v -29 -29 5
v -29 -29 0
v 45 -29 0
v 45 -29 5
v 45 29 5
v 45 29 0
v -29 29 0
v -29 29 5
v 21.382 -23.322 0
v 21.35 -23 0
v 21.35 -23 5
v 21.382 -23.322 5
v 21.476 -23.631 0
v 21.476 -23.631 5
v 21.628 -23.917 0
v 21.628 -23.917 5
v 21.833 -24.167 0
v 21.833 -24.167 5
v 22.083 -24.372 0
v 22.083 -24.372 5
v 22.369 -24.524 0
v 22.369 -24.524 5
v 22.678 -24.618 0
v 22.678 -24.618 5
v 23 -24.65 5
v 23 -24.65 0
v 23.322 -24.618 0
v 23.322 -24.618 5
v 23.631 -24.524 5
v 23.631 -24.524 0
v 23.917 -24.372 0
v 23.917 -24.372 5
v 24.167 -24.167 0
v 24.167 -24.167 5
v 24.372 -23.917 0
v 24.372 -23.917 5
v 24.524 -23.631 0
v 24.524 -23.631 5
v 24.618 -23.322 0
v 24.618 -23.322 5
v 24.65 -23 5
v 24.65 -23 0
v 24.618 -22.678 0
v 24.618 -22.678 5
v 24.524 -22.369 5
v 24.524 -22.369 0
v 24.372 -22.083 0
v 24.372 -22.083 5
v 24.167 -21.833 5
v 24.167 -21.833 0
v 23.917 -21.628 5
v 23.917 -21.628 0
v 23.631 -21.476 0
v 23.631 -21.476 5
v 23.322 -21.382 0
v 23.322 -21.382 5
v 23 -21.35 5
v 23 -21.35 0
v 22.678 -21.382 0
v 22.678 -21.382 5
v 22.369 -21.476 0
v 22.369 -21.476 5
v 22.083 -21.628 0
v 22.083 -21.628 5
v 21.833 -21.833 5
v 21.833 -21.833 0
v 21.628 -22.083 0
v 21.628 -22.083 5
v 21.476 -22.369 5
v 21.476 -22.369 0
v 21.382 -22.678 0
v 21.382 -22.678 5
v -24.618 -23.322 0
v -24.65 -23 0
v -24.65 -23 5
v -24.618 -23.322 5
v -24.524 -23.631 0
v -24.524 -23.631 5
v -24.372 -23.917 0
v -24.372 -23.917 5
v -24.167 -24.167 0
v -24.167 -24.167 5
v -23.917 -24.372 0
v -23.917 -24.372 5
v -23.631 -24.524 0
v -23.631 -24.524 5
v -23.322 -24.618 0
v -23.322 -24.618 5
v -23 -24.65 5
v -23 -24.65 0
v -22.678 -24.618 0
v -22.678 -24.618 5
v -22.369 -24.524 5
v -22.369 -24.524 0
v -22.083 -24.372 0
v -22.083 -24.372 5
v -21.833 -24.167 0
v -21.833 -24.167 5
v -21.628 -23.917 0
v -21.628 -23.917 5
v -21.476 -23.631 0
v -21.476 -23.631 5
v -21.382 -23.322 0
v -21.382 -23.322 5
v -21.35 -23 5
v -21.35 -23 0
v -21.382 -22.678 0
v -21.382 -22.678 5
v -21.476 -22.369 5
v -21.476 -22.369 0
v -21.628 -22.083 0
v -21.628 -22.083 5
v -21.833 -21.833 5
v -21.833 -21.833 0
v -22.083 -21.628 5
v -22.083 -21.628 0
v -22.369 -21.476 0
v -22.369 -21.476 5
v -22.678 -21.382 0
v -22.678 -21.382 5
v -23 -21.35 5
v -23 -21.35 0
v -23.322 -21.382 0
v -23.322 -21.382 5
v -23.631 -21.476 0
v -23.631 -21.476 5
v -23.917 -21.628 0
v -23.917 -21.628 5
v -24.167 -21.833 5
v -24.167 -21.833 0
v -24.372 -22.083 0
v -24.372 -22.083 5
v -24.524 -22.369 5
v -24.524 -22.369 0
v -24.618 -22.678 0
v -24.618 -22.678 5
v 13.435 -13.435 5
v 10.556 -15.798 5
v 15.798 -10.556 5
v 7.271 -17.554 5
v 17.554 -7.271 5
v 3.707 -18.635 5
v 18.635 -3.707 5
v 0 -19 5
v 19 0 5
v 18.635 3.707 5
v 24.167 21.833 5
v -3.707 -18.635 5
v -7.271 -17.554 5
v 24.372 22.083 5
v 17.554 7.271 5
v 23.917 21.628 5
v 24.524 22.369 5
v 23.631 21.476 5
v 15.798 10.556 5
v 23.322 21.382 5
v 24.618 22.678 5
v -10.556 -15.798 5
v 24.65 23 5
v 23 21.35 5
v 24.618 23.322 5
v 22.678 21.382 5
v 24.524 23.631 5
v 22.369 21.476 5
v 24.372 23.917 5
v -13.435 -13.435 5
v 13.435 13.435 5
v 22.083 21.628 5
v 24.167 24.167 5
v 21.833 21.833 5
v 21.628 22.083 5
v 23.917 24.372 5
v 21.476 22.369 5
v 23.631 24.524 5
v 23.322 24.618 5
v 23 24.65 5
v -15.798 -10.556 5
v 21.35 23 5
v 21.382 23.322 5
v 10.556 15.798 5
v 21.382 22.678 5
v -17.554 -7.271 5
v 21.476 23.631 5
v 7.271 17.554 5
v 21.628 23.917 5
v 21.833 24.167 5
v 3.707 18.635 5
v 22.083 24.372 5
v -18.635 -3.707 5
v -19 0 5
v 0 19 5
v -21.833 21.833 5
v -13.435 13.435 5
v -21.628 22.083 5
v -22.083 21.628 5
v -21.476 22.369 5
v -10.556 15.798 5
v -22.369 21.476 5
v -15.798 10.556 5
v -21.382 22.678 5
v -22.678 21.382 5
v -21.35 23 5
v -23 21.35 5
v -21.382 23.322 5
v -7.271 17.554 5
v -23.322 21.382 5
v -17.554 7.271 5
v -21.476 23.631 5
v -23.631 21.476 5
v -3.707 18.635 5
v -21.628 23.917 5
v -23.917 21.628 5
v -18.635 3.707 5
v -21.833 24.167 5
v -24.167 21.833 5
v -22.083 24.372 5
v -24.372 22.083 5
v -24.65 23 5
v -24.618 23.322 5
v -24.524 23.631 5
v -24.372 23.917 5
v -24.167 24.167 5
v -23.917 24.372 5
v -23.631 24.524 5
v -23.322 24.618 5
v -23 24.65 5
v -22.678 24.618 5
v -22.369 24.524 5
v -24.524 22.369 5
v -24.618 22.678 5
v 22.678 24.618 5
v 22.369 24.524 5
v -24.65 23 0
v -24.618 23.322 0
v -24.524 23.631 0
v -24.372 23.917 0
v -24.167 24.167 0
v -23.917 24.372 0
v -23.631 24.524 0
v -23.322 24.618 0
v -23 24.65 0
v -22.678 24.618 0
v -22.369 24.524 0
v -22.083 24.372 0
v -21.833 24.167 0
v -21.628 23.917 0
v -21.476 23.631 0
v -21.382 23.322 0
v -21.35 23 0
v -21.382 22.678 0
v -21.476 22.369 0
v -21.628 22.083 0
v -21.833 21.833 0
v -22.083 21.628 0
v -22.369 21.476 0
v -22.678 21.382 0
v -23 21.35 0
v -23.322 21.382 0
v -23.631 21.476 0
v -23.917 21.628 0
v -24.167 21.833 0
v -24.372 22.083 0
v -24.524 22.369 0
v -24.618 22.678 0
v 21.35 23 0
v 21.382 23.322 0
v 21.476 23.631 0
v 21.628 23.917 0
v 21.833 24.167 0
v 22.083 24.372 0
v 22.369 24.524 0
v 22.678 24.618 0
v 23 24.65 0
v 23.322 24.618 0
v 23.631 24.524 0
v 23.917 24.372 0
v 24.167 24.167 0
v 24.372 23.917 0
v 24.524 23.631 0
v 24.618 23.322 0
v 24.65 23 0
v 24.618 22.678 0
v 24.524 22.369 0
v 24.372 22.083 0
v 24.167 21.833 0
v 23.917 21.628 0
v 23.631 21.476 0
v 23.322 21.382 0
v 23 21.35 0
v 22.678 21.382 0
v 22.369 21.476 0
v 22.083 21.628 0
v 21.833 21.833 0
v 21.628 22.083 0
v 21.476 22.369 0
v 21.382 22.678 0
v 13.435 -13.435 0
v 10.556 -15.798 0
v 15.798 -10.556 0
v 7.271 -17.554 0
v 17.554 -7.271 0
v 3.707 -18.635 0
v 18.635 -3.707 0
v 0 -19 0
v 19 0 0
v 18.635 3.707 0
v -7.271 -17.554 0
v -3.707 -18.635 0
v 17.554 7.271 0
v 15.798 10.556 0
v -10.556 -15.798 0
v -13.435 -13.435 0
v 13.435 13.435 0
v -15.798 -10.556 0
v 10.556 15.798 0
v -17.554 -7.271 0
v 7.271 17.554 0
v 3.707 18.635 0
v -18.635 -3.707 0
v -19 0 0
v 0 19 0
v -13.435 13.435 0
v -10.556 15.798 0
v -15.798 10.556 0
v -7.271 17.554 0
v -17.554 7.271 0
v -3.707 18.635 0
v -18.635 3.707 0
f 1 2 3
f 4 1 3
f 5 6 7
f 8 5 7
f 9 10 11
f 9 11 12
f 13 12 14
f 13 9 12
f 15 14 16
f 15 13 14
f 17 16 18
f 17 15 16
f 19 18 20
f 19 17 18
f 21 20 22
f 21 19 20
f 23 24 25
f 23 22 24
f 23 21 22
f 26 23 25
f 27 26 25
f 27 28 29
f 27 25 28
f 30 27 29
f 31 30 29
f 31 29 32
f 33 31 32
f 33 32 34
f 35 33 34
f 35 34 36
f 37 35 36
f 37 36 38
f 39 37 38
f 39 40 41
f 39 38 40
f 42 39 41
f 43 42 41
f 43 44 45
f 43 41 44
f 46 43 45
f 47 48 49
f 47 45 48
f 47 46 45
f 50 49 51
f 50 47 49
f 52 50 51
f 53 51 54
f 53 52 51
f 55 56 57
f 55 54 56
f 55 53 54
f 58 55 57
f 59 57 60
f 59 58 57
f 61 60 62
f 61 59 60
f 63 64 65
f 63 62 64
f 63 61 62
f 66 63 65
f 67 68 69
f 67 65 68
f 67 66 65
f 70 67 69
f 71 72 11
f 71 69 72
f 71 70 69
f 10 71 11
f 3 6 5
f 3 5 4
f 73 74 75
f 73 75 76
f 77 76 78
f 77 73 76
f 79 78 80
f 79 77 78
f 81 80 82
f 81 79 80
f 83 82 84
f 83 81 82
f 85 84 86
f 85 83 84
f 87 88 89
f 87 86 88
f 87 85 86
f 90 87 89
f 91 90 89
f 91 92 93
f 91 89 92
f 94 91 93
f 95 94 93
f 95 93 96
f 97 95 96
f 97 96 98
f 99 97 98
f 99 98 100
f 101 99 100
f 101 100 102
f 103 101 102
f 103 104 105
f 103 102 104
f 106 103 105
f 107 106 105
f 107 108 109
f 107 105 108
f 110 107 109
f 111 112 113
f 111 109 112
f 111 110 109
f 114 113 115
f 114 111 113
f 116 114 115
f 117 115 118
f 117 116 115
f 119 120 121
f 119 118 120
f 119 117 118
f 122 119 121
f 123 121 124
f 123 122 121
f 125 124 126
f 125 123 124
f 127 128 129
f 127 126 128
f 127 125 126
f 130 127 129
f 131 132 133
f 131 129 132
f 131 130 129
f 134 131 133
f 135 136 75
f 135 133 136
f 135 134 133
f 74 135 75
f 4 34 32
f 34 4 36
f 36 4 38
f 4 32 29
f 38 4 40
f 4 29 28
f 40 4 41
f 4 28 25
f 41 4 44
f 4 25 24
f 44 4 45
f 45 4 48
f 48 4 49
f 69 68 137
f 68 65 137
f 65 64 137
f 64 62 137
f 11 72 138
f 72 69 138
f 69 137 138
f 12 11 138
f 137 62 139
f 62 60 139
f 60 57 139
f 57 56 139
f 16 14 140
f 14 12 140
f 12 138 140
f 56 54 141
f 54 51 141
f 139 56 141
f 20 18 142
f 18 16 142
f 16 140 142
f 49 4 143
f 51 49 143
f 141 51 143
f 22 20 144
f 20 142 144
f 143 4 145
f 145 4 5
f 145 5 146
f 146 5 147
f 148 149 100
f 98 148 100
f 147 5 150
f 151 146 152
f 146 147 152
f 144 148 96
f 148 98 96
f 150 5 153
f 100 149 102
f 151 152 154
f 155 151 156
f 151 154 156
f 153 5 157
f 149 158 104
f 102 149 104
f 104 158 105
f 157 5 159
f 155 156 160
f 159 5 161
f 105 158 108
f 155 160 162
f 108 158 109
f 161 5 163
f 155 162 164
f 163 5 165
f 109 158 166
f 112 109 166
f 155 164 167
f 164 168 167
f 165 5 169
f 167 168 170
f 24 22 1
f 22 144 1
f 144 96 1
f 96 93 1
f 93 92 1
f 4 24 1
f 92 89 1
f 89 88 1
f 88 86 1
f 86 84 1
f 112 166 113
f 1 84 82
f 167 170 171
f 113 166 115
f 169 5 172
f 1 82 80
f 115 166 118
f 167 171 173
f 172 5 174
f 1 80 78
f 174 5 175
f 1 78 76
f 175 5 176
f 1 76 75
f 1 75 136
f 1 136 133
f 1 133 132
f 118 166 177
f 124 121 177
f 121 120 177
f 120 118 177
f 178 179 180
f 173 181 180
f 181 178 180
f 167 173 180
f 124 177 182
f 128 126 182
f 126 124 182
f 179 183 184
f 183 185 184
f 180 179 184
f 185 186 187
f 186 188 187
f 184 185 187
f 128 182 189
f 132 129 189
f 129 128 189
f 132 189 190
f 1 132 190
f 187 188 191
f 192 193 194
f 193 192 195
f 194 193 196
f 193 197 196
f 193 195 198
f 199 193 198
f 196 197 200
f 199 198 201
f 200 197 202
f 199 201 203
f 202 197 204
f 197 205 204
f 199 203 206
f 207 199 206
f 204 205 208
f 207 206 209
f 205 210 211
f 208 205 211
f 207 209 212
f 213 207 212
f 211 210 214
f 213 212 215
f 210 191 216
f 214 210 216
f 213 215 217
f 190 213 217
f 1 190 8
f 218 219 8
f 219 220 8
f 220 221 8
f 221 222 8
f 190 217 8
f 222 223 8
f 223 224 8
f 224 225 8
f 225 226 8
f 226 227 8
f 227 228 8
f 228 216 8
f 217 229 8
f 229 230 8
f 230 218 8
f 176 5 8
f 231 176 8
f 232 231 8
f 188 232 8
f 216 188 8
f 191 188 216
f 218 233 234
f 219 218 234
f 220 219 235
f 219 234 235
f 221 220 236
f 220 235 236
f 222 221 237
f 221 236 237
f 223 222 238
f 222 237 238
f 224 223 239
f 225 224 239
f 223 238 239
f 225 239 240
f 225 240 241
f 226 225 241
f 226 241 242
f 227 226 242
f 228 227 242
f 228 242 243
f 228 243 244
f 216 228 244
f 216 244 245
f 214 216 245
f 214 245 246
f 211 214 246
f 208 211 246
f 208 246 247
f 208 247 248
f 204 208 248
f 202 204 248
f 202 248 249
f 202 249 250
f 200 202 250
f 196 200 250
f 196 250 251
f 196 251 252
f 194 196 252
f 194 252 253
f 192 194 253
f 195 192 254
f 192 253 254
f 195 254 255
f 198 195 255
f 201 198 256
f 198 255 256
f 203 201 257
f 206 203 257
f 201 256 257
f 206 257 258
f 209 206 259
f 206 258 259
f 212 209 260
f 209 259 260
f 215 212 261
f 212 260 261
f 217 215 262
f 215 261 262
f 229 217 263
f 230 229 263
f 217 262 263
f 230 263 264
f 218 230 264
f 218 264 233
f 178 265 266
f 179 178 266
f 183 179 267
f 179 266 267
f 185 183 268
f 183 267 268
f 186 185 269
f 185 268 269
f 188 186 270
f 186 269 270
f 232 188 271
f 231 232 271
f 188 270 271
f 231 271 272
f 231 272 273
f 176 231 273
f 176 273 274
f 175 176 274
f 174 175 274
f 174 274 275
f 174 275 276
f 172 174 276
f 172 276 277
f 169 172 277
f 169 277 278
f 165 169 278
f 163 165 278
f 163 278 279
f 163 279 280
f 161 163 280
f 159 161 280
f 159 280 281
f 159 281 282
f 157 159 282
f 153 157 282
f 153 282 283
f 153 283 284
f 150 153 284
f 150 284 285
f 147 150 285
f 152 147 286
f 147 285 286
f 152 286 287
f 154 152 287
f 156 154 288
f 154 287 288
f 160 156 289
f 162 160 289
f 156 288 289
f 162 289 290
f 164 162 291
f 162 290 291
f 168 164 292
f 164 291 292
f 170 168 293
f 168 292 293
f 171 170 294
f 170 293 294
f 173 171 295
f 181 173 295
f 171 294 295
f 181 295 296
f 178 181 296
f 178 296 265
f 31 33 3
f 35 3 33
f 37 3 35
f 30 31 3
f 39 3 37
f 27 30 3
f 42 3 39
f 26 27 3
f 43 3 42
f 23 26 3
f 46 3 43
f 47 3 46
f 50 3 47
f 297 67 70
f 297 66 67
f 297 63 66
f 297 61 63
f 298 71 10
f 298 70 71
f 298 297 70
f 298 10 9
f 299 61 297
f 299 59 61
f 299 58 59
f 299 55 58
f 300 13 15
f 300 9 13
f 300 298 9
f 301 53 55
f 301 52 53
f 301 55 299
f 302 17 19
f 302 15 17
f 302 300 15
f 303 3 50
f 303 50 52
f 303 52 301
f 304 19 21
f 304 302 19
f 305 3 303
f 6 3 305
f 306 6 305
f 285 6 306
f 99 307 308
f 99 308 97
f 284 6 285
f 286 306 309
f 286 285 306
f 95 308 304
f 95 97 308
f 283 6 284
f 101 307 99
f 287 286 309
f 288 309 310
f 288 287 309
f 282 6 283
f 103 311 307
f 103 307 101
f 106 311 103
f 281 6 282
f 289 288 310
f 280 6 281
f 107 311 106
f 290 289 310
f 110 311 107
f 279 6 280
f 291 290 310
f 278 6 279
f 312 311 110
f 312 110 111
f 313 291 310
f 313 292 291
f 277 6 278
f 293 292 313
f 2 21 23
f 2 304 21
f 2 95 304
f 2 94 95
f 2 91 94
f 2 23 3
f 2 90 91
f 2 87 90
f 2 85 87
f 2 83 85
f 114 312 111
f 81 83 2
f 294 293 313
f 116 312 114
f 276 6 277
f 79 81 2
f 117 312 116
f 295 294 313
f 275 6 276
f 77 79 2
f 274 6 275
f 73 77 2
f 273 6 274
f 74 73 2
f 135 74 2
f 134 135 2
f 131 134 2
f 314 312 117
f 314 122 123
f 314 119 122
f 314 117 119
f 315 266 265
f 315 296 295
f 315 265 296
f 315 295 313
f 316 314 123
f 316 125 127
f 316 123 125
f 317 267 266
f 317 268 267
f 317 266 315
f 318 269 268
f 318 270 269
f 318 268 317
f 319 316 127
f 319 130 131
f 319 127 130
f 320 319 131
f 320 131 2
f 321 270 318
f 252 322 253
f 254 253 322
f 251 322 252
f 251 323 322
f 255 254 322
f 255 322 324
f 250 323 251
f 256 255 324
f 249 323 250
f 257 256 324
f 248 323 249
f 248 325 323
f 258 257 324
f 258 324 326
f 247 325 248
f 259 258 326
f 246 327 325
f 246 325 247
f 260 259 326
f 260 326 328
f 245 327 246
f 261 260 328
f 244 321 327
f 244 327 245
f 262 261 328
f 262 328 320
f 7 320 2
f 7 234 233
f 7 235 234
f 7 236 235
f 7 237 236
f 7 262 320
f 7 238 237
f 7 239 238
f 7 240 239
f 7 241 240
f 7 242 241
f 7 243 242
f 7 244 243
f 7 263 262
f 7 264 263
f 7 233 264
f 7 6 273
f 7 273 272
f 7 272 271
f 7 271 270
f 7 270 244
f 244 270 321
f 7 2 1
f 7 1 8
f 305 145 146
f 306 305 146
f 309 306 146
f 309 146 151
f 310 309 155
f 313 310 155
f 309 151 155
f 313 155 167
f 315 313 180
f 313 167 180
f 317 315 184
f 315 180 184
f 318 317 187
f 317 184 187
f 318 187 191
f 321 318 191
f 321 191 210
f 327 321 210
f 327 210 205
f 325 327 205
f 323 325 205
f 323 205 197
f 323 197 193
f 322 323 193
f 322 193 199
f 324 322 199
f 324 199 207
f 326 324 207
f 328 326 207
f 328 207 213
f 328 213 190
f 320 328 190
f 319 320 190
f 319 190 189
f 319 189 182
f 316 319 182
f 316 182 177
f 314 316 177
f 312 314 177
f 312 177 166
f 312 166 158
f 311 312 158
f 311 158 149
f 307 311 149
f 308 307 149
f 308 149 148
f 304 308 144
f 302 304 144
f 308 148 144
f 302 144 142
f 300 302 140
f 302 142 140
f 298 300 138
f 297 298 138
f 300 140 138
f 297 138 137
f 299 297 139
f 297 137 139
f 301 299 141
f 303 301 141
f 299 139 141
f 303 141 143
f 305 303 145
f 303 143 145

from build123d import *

# Parameters (mm, degrees)
EXTRUDE_1_DEPTH     = 5
HOLE_WIZARD_M4_1_D  = 3.3
SKETCH_5_R          = 19
CUT_EXTRUDE_1_DEPTH = 54.768020235


with BuildPart() as part:
    # 草图1 → 凸台-拉伸1 (new body)
    with BuildSketch(Plane.XY):
        Polygon((29, 29), (45, 29), (45, -29), (29, -29), (-29, -29), (-29, 29), align=None)
    extrude(amount=EXTRUDE_1_DEPTH)

    # M4 螺纹孔的螺纹孔钻头1 (through all)
    with Locations(Plane(origin=(-23, 23, 5), x_dir=(1, 0, 0), z_dir=(0, 0, 1))):
        with Locations((0, 0), (46, 0)):
            hole_wizard_m4_1 = Hole(HOLE_WIZARD_M4_1_D / 2)

    # 镜向1: M4 螺纹孔的螺纹孔钻头1 across plane
    add(hole_wizard_m4_1.mirror(Plane.ZX), mode=Mode.SUBTRACT)

    # 草图5 → 切除-拉伸1 (cut, through all)
    with BuildSketch(Plane.XY.offset(5)):
        Circle(SKETCH_5_R)
    extrude(amount=-CUT_EXTRUDE_1_DEPTH, mode=Mode.SUBTRACT)


solid = part.part
